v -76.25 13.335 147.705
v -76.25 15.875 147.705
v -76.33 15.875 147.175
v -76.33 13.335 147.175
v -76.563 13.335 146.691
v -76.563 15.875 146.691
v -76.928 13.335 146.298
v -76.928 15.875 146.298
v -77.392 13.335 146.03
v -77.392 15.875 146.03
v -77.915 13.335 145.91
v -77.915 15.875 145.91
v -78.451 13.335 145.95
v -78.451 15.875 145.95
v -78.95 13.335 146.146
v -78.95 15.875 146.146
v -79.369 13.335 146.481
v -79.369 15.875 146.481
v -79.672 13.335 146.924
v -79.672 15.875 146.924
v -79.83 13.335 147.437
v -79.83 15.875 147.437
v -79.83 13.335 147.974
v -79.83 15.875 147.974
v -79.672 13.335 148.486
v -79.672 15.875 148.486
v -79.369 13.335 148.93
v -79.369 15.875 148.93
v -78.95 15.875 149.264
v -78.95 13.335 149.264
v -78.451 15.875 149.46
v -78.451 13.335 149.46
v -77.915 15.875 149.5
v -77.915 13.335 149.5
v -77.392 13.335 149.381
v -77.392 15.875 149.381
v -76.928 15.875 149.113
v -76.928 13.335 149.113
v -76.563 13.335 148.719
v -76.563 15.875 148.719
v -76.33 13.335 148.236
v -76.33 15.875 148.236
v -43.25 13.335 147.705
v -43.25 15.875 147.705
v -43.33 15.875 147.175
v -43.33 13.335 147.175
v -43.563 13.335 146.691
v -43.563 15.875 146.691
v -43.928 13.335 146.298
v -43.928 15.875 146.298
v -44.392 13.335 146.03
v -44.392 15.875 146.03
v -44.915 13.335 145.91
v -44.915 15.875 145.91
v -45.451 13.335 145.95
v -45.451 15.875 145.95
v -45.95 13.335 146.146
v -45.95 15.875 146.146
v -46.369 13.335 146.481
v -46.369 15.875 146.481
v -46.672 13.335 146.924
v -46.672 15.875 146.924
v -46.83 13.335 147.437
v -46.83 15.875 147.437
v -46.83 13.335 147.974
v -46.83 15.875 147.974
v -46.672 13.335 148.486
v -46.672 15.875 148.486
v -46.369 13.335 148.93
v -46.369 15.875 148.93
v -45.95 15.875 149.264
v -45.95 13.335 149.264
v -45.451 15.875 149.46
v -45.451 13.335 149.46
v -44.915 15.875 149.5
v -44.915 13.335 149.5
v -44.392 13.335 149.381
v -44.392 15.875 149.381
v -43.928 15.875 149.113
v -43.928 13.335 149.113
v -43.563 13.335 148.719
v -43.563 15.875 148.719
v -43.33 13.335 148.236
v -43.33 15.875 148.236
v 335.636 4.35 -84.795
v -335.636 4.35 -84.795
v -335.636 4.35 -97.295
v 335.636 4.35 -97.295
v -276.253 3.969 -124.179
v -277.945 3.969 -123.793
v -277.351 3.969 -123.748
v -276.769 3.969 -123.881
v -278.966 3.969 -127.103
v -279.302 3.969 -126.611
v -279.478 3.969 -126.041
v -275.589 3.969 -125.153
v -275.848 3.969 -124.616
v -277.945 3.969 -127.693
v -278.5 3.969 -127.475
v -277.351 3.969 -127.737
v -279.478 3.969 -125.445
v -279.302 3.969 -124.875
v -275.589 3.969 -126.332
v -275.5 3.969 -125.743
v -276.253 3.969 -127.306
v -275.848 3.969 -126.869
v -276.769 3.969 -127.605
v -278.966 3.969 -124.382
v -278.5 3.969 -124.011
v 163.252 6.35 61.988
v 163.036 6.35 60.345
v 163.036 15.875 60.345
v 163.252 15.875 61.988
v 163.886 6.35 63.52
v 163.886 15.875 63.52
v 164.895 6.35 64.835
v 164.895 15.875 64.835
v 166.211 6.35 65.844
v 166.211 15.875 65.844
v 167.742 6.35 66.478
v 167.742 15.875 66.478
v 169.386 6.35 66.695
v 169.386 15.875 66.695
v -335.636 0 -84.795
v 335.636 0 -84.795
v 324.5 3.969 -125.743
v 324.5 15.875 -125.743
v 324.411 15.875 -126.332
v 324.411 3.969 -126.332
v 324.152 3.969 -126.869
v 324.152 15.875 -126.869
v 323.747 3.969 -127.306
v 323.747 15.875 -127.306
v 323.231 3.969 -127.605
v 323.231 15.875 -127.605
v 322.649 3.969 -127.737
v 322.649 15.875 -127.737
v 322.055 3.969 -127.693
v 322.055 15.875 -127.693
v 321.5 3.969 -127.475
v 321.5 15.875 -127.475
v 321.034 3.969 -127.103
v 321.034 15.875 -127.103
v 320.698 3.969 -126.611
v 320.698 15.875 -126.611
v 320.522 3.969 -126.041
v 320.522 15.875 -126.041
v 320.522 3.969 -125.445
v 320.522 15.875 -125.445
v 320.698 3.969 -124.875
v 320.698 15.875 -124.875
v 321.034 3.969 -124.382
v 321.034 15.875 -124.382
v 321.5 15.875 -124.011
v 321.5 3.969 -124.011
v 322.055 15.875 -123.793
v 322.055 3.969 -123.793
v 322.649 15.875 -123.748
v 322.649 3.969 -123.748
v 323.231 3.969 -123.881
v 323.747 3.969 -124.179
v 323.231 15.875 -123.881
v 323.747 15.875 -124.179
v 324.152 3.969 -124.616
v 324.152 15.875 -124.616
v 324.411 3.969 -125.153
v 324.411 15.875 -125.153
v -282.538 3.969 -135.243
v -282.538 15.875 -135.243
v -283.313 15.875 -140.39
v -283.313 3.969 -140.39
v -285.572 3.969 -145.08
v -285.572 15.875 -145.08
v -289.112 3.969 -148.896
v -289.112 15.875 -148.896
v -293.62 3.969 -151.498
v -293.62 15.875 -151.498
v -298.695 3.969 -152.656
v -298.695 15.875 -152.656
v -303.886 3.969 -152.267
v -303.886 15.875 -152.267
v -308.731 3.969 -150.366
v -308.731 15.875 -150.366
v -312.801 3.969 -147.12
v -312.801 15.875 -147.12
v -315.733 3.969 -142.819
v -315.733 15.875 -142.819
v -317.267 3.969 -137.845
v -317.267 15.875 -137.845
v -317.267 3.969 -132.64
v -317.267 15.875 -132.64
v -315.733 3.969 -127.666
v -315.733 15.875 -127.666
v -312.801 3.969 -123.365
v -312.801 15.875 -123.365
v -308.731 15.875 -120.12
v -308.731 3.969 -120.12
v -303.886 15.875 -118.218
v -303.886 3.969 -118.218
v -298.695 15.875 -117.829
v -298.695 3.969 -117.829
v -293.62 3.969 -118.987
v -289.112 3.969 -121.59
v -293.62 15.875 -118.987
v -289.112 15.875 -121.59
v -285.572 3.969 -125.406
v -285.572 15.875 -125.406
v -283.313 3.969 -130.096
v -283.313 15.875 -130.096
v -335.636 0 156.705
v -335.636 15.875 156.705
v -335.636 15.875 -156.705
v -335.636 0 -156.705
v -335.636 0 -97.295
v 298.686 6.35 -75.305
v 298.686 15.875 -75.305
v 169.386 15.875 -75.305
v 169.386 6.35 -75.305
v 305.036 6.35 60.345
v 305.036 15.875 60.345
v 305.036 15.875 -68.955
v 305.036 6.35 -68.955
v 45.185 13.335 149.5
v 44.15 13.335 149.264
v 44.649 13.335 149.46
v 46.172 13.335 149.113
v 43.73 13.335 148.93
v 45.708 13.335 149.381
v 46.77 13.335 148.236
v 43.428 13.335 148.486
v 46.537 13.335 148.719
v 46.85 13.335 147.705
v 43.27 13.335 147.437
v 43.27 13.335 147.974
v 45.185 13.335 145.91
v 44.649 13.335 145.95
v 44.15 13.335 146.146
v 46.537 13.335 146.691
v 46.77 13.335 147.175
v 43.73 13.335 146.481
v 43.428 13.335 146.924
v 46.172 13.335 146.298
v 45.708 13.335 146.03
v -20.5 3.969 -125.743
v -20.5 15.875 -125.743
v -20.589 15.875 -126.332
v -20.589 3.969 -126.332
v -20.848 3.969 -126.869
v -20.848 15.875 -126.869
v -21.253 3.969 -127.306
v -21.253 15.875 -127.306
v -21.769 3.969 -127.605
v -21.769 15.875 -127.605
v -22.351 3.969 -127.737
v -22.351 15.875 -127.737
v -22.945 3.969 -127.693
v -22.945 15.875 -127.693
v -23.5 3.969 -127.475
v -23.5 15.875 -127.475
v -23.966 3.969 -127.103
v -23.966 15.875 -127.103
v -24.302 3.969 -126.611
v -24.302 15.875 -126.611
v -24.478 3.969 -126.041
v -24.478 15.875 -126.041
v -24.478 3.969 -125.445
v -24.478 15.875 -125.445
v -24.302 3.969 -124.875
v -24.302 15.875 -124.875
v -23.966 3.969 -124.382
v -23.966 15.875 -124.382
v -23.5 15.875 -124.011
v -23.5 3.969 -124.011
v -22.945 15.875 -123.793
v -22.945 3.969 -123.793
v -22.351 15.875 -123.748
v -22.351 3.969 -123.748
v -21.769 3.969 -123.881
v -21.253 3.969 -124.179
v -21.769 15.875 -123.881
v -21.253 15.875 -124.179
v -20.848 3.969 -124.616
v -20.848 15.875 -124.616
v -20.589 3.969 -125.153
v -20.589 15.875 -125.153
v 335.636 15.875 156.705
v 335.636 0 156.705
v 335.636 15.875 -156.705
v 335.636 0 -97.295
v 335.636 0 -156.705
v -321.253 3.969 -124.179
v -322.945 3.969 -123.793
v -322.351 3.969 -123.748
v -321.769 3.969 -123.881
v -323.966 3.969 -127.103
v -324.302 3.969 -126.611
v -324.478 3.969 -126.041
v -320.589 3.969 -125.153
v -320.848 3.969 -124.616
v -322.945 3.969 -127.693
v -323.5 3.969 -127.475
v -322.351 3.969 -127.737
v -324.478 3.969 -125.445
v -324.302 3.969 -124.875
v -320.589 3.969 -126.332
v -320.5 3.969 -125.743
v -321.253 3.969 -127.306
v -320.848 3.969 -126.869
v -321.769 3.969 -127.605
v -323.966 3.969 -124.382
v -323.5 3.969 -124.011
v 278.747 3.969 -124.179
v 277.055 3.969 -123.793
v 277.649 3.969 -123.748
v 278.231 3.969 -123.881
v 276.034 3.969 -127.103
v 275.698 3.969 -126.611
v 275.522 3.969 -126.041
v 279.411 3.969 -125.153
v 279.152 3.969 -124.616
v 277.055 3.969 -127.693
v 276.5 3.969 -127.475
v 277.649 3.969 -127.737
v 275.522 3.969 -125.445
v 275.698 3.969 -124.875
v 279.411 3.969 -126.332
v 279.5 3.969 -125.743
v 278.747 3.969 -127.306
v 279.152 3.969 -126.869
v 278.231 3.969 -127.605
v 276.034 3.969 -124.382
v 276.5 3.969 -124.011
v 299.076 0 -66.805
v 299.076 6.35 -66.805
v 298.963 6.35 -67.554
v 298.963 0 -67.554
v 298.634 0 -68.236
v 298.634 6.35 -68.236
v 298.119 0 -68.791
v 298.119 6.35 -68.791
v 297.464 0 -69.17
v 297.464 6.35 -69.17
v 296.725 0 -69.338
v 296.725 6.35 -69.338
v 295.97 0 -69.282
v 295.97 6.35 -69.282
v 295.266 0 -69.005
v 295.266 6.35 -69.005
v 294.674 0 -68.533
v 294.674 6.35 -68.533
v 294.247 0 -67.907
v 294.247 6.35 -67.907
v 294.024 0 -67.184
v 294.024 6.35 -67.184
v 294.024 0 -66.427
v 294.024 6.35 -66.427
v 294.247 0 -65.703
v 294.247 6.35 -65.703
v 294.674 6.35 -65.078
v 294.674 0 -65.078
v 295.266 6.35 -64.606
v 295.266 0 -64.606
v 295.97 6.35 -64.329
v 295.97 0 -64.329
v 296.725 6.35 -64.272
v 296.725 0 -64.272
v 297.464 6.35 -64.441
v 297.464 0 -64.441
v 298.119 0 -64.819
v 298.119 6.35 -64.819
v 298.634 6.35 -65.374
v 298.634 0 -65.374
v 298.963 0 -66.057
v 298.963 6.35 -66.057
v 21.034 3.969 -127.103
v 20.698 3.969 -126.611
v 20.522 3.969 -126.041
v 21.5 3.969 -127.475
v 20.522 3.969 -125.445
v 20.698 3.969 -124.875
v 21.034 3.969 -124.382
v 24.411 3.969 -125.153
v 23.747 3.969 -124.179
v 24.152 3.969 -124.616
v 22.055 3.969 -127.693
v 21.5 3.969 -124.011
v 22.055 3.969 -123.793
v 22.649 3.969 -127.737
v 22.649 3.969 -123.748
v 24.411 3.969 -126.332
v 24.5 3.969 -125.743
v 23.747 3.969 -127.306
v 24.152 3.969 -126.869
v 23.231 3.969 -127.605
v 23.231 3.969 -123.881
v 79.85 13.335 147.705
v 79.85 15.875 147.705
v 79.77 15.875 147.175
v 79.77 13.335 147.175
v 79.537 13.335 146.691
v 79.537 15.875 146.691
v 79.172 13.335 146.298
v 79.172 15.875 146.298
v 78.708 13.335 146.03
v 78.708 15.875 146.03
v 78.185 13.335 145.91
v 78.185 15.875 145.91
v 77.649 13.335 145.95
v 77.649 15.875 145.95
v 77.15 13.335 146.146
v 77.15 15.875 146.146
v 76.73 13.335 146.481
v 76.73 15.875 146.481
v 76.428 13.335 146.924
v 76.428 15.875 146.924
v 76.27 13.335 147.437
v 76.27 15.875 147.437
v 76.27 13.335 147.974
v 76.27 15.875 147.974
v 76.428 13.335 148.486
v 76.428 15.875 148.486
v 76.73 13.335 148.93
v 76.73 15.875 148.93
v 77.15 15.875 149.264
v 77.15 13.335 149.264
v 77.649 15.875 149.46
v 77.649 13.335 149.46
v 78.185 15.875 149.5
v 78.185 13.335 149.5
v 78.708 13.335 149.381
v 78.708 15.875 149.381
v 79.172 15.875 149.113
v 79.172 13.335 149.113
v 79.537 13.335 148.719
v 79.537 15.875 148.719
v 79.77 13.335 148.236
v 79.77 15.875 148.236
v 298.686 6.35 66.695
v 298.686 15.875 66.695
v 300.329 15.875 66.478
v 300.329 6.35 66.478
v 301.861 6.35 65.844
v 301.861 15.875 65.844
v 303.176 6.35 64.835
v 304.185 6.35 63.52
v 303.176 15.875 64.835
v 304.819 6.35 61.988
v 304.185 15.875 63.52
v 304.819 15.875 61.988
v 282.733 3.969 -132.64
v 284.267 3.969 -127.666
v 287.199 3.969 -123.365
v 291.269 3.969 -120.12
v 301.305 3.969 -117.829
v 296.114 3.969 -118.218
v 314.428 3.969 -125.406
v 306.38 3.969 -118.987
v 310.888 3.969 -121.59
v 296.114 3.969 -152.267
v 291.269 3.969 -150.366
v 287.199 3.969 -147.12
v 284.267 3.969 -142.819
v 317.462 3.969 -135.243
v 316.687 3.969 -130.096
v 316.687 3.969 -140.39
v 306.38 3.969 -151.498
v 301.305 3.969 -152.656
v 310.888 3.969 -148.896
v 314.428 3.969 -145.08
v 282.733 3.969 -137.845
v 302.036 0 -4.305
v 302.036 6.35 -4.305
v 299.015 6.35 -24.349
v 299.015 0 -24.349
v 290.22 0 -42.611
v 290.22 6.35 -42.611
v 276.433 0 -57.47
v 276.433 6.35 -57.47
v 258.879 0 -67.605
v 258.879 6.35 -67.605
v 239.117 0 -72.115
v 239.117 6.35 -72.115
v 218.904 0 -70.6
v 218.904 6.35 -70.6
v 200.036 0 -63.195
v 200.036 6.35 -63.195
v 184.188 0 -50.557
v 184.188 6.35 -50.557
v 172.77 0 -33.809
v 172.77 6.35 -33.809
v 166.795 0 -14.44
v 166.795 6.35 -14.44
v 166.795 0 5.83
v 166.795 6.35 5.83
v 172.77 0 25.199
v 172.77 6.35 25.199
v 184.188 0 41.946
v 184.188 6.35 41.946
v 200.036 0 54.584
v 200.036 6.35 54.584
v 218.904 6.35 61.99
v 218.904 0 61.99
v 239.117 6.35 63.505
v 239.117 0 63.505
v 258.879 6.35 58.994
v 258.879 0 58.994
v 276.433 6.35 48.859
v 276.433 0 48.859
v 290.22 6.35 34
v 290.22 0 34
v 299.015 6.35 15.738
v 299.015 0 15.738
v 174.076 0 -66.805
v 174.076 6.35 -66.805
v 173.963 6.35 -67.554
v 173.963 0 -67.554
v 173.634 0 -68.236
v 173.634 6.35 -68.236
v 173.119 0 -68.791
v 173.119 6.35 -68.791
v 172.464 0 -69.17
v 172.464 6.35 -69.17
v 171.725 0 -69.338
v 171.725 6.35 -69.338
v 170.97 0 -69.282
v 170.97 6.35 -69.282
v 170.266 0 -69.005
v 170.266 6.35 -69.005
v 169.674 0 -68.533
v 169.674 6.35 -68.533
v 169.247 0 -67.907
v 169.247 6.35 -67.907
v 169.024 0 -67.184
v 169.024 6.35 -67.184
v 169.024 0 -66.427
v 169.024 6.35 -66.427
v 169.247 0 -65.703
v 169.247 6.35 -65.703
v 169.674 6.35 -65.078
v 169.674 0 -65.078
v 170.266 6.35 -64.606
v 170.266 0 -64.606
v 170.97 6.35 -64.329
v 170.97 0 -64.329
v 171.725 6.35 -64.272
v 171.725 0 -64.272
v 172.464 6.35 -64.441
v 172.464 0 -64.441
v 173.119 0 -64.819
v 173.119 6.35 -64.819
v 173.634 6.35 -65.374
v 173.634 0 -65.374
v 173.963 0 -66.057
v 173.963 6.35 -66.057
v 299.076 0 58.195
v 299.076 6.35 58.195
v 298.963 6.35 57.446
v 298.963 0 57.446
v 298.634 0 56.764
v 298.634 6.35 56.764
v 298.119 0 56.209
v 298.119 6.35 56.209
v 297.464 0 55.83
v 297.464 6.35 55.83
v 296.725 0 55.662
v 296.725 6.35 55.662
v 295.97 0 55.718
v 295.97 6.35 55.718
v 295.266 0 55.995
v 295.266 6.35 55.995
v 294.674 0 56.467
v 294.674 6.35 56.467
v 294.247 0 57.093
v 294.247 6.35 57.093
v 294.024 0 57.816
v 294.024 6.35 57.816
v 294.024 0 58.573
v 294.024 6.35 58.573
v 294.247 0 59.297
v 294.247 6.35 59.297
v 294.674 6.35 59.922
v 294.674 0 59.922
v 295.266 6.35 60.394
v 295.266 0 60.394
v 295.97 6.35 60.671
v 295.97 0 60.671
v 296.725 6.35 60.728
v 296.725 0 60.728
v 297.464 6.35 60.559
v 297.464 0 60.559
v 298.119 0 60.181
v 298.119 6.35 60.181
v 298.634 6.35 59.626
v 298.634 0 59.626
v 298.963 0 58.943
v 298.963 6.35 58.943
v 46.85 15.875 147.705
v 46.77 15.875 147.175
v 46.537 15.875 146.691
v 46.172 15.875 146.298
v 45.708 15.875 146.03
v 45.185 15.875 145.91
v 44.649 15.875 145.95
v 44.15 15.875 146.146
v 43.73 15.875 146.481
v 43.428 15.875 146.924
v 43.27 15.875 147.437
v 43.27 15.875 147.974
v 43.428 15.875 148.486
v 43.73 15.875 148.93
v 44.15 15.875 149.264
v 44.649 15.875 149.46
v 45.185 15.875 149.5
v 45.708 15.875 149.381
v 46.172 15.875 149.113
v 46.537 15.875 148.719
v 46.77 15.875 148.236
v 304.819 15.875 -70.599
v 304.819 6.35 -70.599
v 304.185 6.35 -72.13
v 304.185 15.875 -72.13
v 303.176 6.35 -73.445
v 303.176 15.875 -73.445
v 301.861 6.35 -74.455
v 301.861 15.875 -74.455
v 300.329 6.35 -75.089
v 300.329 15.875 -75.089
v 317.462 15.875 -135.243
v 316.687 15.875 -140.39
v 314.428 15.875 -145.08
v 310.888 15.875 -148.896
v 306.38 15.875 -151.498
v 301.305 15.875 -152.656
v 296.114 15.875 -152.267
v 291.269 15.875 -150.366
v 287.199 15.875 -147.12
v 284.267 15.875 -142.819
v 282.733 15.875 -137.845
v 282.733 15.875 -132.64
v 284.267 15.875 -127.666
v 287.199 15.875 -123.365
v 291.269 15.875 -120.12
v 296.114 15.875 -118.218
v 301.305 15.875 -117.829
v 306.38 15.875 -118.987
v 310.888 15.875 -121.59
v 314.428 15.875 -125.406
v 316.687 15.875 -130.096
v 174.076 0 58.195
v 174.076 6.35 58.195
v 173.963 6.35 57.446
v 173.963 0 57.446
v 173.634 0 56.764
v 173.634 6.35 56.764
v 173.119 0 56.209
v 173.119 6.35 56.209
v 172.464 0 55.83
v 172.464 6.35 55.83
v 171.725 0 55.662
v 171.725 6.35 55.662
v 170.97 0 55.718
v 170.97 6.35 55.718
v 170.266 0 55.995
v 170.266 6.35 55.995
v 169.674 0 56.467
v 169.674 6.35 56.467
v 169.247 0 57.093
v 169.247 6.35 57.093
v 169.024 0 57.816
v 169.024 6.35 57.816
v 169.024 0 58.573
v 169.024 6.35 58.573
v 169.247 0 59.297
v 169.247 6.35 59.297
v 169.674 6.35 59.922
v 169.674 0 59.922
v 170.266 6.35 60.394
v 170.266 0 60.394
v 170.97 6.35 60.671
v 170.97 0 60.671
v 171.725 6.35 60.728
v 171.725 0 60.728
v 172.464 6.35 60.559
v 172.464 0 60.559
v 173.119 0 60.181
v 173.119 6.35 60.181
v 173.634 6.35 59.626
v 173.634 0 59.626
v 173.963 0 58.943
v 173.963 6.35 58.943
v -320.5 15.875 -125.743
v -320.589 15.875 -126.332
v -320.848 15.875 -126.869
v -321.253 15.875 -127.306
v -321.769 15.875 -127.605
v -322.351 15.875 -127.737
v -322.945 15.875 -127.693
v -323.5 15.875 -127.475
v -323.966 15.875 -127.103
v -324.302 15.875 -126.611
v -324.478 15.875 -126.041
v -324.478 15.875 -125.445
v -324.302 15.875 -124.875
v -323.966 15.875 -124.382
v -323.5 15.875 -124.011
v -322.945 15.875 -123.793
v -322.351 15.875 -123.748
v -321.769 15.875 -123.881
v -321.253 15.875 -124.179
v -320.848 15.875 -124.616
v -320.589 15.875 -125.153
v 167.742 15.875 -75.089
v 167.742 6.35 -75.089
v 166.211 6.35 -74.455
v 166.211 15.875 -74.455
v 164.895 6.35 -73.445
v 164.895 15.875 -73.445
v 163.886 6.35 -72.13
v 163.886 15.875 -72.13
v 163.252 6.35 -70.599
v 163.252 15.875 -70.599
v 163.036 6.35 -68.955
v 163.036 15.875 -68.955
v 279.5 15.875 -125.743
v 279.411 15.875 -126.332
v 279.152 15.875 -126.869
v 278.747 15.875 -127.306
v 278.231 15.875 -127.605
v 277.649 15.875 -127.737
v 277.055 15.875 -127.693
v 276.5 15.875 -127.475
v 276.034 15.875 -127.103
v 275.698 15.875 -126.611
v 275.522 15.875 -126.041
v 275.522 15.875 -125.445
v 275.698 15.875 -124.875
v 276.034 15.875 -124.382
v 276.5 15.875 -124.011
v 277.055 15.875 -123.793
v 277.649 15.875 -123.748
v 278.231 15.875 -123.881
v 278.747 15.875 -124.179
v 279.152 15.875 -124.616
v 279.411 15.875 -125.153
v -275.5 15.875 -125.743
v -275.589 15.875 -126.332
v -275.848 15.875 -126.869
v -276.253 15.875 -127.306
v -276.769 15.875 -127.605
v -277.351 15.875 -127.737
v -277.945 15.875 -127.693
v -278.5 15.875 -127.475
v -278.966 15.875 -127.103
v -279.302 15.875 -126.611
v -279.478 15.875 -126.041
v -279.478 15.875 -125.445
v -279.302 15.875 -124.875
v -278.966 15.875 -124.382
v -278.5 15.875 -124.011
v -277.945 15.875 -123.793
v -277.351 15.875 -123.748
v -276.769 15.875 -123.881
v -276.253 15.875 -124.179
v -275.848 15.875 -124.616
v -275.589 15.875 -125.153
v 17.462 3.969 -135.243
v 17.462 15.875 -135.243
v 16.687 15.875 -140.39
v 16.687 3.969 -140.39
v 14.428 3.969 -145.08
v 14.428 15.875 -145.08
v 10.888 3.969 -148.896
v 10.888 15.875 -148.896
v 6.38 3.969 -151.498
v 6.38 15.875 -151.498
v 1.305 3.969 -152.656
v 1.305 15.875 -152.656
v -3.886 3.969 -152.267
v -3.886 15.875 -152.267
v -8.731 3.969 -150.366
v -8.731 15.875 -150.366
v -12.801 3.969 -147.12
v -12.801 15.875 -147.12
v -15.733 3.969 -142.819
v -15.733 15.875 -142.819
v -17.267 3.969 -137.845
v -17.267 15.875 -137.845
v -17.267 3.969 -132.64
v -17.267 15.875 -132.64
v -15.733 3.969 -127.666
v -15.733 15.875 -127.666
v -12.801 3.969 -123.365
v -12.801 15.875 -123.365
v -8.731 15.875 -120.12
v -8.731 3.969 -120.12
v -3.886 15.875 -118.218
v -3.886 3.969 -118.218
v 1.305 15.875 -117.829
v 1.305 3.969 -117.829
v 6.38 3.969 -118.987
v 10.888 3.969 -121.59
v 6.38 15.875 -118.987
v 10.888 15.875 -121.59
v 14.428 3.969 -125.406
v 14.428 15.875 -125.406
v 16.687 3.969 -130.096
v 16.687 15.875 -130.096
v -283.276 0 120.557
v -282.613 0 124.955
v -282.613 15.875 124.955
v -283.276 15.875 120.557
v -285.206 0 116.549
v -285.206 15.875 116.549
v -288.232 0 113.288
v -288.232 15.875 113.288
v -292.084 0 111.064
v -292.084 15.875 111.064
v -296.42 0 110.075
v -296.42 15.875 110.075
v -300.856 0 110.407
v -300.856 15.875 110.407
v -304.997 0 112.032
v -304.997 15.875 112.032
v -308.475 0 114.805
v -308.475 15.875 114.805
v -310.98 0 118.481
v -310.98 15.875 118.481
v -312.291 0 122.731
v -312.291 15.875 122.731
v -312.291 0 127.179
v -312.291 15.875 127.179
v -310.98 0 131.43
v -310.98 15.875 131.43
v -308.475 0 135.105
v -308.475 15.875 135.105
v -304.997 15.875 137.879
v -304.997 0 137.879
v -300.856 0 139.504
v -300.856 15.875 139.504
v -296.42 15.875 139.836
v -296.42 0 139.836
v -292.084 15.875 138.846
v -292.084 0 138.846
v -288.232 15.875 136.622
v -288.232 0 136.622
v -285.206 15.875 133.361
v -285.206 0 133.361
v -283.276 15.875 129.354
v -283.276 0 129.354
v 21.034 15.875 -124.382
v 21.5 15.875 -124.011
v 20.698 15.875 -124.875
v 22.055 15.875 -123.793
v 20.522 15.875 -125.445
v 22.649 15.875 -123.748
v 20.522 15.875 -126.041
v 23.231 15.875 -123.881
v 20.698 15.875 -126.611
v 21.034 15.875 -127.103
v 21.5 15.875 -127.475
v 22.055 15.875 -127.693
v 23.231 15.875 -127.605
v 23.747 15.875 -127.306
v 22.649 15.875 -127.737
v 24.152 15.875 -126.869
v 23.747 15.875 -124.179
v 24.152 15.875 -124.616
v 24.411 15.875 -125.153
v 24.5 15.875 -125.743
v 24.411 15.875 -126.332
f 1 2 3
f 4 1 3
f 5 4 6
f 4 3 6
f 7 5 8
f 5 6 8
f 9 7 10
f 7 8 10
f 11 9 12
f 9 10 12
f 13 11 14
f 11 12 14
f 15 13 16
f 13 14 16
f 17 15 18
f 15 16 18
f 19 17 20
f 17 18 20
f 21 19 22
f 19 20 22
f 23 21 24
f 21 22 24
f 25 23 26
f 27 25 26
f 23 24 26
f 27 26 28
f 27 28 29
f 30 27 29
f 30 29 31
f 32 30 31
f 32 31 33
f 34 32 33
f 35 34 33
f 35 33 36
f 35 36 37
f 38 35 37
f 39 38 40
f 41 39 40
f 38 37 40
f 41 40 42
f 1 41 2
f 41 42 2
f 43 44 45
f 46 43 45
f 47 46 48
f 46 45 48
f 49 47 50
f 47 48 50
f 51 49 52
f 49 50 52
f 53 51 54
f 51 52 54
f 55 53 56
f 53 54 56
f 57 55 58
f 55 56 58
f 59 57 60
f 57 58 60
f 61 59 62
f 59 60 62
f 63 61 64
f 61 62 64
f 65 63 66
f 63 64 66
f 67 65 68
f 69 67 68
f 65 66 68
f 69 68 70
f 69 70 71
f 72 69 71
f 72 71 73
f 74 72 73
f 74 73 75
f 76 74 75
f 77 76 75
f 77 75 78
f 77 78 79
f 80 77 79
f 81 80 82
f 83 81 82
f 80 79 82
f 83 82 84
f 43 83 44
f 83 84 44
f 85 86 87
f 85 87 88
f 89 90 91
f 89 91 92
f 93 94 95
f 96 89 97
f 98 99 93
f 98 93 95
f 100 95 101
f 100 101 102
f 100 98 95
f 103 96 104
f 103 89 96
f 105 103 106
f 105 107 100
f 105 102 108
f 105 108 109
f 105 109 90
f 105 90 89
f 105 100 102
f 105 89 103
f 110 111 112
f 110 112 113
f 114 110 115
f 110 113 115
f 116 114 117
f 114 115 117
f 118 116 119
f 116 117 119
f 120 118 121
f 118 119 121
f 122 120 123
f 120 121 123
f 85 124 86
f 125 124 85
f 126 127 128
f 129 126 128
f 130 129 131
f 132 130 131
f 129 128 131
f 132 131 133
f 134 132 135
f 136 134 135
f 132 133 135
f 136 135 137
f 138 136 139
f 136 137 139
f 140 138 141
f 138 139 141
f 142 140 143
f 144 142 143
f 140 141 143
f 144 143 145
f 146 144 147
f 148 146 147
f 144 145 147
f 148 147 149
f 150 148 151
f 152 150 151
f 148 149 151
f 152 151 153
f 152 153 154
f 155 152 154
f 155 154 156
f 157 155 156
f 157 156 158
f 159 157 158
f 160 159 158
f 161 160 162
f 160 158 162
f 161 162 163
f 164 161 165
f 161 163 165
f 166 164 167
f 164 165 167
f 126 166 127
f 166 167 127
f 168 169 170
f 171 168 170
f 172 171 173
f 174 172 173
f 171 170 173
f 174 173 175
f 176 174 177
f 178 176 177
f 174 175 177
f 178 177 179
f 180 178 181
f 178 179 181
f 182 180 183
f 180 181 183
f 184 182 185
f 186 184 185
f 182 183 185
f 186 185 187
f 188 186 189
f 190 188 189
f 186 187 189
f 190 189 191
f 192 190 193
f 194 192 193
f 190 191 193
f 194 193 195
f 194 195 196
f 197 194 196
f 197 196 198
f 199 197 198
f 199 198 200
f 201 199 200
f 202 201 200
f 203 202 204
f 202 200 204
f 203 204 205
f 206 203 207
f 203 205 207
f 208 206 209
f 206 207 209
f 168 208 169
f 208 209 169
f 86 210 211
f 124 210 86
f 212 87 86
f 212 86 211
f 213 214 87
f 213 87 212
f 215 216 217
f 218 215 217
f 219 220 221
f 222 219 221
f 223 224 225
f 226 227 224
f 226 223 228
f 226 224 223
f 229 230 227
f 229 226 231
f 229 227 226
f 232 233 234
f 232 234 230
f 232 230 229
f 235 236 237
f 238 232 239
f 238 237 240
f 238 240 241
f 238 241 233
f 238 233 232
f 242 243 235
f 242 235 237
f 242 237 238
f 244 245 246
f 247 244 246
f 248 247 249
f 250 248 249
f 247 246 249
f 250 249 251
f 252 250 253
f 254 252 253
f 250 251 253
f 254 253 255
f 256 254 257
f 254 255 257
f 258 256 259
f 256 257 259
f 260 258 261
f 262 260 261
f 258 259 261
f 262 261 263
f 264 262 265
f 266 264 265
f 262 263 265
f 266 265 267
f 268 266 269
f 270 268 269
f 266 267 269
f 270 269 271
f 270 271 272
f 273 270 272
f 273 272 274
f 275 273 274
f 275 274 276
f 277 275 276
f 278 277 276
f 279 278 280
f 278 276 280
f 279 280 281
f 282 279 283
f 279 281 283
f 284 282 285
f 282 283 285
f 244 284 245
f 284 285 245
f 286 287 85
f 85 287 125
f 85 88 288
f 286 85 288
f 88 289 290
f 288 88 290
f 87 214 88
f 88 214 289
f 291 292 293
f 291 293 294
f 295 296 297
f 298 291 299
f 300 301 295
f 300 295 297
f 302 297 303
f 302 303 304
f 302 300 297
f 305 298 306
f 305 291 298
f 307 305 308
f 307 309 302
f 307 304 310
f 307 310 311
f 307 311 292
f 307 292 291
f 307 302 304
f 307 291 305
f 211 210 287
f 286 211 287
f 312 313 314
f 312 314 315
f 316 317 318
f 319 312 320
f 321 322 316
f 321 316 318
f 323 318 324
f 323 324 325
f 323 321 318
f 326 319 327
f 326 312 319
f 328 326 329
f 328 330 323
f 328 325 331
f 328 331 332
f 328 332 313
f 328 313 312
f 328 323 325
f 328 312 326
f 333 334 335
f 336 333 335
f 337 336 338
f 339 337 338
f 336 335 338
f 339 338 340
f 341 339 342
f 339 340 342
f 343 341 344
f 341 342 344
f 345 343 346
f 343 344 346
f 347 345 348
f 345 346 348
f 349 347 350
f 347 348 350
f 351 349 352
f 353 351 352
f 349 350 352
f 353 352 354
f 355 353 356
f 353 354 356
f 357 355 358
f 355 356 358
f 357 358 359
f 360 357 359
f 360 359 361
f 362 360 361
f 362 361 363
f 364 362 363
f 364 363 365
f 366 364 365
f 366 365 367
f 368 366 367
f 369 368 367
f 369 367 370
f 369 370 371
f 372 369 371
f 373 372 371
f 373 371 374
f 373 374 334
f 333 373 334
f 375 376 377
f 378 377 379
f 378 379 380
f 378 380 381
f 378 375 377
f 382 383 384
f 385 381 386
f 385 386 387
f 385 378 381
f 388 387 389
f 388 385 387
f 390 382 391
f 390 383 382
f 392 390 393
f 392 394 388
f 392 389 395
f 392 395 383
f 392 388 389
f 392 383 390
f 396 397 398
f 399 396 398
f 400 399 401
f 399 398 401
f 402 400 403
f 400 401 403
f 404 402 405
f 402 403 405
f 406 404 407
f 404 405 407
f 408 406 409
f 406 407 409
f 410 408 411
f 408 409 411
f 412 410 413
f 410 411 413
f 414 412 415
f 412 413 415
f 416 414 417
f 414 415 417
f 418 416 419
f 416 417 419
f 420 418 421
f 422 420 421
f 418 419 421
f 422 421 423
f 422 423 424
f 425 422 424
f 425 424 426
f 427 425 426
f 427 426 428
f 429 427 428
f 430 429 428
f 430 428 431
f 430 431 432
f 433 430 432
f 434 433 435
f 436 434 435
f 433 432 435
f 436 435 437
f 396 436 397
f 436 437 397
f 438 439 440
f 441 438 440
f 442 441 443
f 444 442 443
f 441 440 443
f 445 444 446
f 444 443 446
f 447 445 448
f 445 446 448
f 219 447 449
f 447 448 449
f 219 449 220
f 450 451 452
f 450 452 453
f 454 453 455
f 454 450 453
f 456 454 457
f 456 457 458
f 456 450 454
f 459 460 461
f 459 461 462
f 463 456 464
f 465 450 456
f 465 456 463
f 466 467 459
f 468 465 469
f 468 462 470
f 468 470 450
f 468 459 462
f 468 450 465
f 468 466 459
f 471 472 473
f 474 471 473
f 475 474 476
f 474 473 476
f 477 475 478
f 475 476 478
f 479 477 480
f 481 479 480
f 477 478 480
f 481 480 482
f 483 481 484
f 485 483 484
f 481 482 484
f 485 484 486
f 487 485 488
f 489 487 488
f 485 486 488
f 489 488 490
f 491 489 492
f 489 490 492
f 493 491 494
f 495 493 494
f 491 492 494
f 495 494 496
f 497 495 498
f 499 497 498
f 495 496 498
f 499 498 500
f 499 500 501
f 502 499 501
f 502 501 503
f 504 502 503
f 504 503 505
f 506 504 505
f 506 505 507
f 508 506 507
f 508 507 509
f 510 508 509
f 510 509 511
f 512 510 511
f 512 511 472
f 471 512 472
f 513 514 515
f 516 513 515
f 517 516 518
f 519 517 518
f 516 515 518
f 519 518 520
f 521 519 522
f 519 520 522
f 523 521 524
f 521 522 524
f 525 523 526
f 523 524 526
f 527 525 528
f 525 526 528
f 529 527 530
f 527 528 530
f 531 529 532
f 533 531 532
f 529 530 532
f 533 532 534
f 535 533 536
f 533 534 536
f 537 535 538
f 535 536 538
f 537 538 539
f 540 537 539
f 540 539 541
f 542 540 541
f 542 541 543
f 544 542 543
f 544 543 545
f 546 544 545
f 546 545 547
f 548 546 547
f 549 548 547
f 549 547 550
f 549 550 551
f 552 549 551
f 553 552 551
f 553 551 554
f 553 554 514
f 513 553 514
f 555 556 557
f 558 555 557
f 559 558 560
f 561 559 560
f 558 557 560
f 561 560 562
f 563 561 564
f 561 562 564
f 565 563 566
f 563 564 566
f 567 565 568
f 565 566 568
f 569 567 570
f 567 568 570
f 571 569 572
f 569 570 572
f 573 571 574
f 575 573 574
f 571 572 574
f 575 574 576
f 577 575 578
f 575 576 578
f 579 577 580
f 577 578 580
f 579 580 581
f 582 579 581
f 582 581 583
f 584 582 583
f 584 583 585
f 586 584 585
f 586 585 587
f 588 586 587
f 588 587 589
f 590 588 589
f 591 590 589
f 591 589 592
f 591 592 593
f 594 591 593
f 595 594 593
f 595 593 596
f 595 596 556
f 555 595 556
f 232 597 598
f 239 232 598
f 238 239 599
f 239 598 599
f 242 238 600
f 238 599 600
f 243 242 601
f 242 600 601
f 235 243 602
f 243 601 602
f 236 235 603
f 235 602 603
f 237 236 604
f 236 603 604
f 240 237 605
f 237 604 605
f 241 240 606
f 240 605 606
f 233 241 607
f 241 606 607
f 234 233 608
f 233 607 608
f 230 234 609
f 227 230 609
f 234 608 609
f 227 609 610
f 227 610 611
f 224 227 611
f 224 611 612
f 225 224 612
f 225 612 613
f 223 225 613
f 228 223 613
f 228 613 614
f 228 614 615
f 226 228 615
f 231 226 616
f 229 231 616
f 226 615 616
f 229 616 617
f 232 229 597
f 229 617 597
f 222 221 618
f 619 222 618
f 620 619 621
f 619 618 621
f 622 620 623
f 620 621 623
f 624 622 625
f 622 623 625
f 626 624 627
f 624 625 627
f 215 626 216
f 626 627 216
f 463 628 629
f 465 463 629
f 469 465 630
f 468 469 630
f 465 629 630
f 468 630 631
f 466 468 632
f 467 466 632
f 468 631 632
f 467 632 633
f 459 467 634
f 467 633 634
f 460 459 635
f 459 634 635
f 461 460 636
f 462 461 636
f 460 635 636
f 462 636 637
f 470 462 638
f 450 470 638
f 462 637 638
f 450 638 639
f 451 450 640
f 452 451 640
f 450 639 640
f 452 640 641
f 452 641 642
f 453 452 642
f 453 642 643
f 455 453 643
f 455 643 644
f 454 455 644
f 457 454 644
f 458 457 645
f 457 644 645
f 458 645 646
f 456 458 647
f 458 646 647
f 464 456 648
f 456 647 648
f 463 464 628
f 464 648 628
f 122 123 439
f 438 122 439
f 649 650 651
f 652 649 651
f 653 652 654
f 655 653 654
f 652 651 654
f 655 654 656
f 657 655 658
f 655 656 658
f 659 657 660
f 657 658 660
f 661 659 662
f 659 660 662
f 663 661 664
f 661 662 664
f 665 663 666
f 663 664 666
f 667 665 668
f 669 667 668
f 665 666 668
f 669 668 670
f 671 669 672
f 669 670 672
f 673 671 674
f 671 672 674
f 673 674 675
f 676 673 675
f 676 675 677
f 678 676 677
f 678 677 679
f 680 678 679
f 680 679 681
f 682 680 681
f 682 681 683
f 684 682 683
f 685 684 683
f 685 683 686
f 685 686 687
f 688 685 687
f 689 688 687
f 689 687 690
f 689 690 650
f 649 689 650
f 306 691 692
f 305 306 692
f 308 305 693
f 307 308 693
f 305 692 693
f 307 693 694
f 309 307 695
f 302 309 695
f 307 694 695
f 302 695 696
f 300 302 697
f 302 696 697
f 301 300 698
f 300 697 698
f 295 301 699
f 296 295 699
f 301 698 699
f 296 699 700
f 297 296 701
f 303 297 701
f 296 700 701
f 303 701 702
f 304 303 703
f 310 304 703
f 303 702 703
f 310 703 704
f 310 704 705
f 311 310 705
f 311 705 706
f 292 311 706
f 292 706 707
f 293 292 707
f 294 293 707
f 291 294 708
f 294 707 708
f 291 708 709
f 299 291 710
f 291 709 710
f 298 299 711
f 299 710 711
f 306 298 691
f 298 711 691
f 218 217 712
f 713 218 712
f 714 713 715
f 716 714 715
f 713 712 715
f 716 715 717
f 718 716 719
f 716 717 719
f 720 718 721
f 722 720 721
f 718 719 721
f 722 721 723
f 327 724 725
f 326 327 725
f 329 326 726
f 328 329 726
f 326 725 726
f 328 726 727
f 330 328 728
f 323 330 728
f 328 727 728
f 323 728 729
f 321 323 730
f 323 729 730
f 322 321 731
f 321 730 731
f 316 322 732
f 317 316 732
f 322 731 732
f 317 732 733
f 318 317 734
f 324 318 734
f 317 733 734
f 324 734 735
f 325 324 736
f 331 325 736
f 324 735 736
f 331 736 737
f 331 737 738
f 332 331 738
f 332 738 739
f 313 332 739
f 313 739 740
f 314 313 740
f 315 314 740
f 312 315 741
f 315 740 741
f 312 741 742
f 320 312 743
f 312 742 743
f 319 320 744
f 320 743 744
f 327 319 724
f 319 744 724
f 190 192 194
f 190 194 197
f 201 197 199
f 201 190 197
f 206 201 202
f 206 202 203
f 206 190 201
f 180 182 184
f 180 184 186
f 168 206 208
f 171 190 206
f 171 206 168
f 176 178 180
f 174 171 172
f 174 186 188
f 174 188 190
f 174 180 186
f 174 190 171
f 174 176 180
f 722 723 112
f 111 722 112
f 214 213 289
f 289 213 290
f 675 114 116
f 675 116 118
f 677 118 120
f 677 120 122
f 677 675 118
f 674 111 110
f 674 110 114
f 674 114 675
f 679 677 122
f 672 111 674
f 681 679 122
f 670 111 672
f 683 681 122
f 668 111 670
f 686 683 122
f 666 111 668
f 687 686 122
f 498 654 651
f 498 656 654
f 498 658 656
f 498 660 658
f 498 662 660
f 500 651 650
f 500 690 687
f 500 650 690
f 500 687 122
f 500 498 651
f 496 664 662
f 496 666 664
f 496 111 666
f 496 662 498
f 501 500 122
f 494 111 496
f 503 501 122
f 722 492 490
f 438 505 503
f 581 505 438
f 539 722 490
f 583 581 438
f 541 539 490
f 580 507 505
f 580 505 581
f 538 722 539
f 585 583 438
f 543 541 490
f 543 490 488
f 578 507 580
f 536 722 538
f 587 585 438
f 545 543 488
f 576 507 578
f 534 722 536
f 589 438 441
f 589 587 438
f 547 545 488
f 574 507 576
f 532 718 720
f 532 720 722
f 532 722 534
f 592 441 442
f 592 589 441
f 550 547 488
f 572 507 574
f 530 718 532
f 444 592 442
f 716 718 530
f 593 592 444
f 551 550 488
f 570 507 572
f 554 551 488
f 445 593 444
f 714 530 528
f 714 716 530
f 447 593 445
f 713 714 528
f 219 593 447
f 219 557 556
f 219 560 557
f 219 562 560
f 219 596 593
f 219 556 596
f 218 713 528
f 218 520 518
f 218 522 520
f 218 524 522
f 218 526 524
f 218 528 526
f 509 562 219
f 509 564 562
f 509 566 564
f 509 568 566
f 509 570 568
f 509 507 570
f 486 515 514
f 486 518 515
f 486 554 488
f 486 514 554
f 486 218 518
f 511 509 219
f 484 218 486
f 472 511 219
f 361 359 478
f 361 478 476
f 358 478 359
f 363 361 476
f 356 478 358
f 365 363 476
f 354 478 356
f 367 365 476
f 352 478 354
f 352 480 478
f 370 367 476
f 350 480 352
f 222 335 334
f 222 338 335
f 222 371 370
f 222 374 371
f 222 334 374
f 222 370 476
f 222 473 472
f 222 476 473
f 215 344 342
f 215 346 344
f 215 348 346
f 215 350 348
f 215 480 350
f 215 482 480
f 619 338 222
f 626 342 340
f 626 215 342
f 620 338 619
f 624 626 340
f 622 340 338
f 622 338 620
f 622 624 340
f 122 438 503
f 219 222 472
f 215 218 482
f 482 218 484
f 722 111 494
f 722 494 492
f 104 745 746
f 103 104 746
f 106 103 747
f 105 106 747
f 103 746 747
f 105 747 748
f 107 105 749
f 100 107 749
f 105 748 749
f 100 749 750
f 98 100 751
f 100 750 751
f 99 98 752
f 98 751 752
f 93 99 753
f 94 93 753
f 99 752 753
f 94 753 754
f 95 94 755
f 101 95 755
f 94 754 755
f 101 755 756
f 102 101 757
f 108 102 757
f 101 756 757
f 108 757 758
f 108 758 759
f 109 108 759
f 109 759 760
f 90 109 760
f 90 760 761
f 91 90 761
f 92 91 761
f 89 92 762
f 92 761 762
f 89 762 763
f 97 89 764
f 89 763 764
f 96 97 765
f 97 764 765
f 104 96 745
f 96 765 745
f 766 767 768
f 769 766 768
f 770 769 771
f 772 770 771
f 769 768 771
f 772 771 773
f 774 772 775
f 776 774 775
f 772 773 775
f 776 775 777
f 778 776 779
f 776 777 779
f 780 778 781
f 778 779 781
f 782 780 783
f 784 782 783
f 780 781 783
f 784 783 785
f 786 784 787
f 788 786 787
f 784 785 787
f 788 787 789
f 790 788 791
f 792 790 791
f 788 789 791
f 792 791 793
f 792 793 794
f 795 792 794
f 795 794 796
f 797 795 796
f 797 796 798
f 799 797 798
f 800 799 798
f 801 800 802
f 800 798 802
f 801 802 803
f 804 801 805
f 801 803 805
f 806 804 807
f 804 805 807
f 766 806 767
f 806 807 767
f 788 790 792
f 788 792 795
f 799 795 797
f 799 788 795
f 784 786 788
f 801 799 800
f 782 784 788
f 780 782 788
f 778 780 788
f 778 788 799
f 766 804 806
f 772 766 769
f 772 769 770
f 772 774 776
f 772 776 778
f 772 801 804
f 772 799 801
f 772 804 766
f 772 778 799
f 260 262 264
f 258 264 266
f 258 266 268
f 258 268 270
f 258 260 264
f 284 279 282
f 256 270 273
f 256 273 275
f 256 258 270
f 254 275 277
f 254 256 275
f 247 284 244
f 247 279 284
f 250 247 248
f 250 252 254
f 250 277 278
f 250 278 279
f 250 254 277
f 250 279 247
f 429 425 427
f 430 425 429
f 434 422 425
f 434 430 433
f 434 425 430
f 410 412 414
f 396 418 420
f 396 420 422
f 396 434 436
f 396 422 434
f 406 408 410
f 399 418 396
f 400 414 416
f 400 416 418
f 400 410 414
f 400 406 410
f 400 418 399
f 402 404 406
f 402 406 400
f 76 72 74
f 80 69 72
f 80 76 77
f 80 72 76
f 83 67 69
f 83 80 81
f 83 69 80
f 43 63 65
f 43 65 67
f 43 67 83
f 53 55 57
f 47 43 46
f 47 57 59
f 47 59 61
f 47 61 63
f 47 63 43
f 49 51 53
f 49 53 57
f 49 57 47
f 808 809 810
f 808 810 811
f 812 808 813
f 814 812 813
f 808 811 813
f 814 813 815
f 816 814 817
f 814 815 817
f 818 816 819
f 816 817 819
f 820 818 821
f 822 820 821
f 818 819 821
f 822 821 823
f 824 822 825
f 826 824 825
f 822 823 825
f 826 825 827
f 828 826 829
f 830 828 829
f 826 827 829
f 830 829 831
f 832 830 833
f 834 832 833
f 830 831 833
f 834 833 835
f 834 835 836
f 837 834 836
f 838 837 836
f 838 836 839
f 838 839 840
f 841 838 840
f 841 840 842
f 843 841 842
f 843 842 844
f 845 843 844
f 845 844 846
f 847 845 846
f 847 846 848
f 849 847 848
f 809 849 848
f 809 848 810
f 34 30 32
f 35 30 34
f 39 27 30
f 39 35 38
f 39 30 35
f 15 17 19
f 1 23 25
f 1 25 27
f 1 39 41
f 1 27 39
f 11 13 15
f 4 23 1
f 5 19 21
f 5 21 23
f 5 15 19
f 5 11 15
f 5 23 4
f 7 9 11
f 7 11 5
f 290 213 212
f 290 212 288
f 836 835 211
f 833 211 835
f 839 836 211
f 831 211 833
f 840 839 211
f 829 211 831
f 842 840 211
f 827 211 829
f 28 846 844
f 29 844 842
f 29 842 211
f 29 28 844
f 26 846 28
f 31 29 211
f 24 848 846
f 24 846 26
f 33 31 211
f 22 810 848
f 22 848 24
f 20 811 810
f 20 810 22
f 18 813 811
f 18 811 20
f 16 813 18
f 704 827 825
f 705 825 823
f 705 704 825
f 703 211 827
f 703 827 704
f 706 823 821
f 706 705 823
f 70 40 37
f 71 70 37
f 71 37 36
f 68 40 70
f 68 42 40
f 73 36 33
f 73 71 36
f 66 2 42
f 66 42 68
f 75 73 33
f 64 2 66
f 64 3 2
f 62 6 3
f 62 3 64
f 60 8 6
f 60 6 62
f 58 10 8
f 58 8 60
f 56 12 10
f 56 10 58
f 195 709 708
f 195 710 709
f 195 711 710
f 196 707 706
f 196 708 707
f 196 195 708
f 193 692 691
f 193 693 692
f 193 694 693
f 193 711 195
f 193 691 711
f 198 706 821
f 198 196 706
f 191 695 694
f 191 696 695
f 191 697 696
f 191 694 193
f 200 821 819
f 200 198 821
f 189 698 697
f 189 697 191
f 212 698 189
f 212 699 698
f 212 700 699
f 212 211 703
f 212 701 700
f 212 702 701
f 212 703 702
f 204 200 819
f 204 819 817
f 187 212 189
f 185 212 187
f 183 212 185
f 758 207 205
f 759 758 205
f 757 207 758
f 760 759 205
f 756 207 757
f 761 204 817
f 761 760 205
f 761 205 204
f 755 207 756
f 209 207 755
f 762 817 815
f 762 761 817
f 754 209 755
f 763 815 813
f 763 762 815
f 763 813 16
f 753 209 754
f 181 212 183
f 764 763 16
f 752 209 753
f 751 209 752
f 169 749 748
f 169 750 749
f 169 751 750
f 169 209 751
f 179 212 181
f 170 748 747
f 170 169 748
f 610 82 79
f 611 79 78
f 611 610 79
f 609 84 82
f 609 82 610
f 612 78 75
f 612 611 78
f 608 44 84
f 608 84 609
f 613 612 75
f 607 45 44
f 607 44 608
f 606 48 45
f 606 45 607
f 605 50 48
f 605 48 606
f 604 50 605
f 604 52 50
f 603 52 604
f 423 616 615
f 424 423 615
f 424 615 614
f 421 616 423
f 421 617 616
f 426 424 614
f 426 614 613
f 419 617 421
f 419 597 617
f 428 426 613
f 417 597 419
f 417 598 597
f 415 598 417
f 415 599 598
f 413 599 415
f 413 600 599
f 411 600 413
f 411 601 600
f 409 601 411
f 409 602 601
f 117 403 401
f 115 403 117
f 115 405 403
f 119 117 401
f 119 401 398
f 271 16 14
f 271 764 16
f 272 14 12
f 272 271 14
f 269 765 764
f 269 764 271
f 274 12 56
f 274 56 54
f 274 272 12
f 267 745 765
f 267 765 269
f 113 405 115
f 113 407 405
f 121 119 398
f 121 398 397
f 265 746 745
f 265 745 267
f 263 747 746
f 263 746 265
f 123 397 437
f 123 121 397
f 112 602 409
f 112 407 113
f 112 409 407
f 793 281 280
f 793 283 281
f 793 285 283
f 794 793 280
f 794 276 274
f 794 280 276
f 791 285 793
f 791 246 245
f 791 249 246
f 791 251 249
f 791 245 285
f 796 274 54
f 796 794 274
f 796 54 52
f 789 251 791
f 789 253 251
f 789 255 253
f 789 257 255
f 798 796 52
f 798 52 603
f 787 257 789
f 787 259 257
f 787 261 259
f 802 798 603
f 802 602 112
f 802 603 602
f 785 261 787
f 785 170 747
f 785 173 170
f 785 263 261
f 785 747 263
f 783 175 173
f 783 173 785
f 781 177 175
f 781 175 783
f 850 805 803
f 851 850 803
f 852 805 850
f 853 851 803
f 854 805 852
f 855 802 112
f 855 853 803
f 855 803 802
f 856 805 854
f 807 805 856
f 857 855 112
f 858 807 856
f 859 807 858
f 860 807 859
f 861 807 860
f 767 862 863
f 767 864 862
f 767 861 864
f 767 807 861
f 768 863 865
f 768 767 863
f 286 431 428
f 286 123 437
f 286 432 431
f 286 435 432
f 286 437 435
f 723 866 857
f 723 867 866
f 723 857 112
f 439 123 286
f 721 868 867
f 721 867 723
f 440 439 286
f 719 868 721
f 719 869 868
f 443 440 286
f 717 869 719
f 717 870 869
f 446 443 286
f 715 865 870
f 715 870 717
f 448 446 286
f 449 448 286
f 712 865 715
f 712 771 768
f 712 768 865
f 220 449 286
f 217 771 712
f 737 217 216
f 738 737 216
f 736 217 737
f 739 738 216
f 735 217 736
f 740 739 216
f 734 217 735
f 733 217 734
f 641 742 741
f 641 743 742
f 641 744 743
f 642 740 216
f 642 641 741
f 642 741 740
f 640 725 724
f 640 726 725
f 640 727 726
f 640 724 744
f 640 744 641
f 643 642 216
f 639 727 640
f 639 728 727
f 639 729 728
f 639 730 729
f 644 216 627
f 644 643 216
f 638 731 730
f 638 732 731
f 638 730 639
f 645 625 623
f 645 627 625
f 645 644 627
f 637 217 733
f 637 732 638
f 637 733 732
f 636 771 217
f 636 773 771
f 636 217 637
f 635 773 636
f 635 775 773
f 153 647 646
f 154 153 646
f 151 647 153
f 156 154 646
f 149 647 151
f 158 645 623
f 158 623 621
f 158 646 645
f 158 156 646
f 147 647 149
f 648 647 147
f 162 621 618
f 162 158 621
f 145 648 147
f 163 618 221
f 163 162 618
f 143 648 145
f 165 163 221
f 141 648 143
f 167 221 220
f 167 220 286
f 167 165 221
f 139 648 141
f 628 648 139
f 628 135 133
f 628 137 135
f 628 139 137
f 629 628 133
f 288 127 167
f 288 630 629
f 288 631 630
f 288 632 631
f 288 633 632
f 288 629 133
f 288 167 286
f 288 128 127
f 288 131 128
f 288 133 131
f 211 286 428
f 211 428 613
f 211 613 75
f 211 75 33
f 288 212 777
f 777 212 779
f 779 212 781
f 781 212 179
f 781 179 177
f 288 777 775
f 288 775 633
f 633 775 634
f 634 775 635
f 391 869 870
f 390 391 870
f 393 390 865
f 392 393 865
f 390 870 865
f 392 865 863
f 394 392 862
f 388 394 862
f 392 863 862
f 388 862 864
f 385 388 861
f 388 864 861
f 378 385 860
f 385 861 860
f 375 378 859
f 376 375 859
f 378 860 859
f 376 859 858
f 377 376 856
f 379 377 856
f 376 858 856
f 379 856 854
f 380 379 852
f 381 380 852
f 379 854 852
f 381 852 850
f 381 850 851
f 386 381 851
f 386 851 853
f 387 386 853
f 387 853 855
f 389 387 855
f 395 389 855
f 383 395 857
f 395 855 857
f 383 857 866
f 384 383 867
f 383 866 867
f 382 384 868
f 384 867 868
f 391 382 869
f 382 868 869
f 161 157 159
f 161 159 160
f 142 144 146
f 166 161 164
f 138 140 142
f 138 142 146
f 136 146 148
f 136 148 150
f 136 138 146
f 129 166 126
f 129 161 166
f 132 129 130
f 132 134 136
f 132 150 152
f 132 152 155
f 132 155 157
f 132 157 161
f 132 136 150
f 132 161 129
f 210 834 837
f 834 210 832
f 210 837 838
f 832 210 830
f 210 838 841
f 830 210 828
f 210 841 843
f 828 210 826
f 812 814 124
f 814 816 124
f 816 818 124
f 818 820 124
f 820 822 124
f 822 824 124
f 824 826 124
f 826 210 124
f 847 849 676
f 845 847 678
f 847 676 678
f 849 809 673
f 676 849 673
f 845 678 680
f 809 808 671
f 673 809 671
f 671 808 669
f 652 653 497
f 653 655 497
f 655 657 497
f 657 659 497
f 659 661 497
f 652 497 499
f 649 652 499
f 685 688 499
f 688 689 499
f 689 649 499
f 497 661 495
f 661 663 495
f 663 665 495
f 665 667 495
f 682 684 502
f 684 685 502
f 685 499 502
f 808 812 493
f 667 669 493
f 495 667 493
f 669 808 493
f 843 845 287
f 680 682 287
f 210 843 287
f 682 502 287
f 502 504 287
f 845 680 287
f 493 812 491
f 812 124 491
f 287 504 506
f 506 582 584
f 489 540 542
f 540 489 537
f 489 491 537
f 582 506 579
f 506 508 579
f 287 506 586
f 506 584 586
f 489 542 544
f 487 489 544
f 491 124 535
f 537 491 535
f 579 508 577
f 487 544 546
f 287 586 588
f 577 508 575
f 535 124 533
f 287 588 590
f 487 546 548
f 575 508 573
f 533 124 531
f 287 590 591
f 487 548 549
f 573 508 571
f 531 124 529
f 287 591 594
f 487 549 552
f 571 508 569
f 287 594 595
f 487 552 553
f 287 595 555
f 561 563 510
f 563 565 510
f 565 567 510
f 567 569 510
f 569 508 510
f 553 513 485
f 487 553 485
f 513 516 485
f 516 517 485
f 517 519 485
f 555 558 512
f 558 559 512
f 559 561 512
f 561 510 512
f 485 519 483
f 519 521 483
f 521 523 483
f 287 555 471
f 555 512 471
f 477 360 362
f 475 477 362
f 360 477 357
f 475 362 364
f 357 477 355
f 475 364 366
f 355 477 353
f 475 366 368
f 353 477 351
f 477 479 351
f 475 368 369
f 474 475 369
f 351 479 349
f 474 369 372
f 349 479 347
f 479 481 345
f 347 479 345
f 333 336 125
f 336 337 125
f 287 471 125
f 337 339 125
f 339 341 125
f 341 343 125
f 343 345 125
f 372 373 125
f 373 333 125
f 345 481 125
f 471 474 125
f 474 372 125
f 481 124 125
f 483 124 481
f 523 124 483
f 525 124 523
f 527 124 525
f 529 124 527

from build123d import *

# Parameters (mm, degrees)
SKETCH1_W               = 671.2712
SKETCH1_H               = 313.4106
BOSS_EXTRUDE1_DEPTH     = 15.875
SKETCH4_R               = 14.9225
CUT_EXTRUDE2_DEPTH      = 1
CUT_EXTRUDE2_DEPTH_BACK = 16.875
SKETCH5_R               = 17.4625
SKETCH5_R_2             = 2
CUT_EXTRUDE3_DEPTH      = 11.90625
SKETCH6_R               = 1.8
CUT_EXTRUDE4_DEPTH      = 2.54
SKETCH7_R               = 68
SKETCH7_R_2             = 2.54
CUT_EXTRUDE5_DEPTH      = 1
CUT_EXTRUDE5_DEPTH_BACK = 16.875
CUT_EXTRUDE6_DEPTH      = 9.525
SKETCH9_W               = 671.2712
SKETCH9_H               = 12.5
CUT_EXTRUDE7_DEPTH      = 4.35


with BuildPart() as part:
    # Sketch1 → Boss-Extrude1 (new body)
    with BuildSketch(Plane(origin=(0, 0, 0), x_dir=(1, 0, 0), z_dir=(0, 1, 0))):
        Rectangle(SKETCH1_W, SKETCH1_H)
    extrude(amount=BOSS_EXTRUDE1_DEPTH)

    # Sketch4 → Cut-Extrude2 (cut, two sides)
    with BuildSketch(Plane(origin=(0, 15.875, 0), x_dir=(1, 0, 0), z_dir=(0, 1, 0))) as cut_extrude2_sk:
        with Locations((-297.5356, -124.9553)):
            Circle(SKETCH4_R)
    extrude(amount=CUT_EXTRUDE2_DEPTH, mode=Mode.SUBTRACT)
    extrude(cut_extrude2_sk.sketch, amount=-CUT_EXTRUDE2_DEPTH_BACK, mode=Mode.SUBTRACT)

    # Sketch5 → Cut-Extrude3 (cut)
    with BuildSketch(Plane(origin=(0, 15.875, 0), x_dir=(1, 0, 0), z_dir=(0, 1, 0))):
        with Locations((0, 135.2428)):
            Circle(SKETCH5_R)
        with Locations((22.5, 125.7428)):
            Circle(SKETCH5_R_2)
        with Locations((-22.5, 125.7428)):
            Circle(SKETCH5_R_2)
        with Locations((-300, 135.2428)):
            Circle(SKETCH5_R)
        with Locations((-277.5, 125.7428)):
            Circle(SKETCH5_R_2)
        with Locations((-322.5, 125.7428)):
            Circle(SKETCH5_R_2)
        with Locations((322.5, 125.7428)):
            Circle(SKETCH5_R_2)
        with Locations((277.5, 125.7428)):
            Circle(SKETCH5_R_2)
        with Locations((300, 135.2428)):
            Circle(SKETCH5_R)
    extrude(amount=-CUT_EXTRUDE3_DEPTH, mode=Mode.SUBTRACT)

    # Sketch6 → Cut-Extrude4 (cut)
    with BuildSketch(Plane(origin=(0, 15.875, 0), x_dir=(1, 0, 0), z_dir=(0, 1, 0))):
        with Locations((78.0499912, -147.7053)):
            Circle(SKETCH6_R)
        with Locations((45.0499912, -147.7053)):
            Circle(SKETCH6_R)
        with Locations((-45.0499912, -147.7053)):
            Circle(SKETCH6_R)
        with Locations((-78.0499912, -147.7053)):
            Circle(SKETCH6_R)
    extrude(amount=-CUT_EXTRUDE4_DEPTH, mode=Mode.SUBTRACT)

    # Sketch7 → Cut-Extrude5 (cut, two sides)
    with BuildSketch(Plane(origin=(0, 15.875, 0), x_dir=(1, 0, 0), z_dir=(0, 1, 0))) as cut_extrude5_sk:
        with Locations((234.0356, 4.3053)):
            Circle(SKETCH7_R)
        with Locations((296.5356, -58.1947)):
            Circle(SKETCH7_R_2)
        with Locations((296.5356, 66.8053)):
            Circle(SKETCH7_R_2)
        with Locations((171.5356, 66.8053)):
            Circle(SKETCH7_R_2)
        with Locations((171.5356, -58.1947)):
            Circle(SKETCH7_R_2)
    extrude(amount=CUT_EXTRUDE5_DEPTH, mode=Mode.SUBTRACT)
    extrude(cut_extrude5_sk.sketch, amount=-CUT_EXTRUDE5_DEPTH_BACK, mode=Mode.SUBTRACT)

    # Sketch8 → Cut-Extrude6 (cut)
    with BuildSketch(Plane(origin=(0, 15.875, 0), x_dir=(1, 0, 0), z_dir=(0, 1, 0))):
        with BuildLine():
            Line((169.3856, -66.6947), (298.6856, -66.6947))
            ThreePointArc((298.6856, -66.6947), (303.175728061, -64.834828061), (305.0356, -60.3447))
            Line((305.0356, -60.3447), (305.0356, 68.9553))
            ThreePointArc((305.0356, 68.9553), (303.175728061, 73.445428061), (298.6856, 75.3053))
            Line((298.6856, 75.3053), (169.3856, 75.3053))
            ThreePointArc((169.3856, 75.3053), (164.895471939, 73.445428061), (163.0356, 68.9553))
            Line((163.0356, 68.9553), (163.0356, -60.3447))
            ThreePointArc((163.0356, -60.3447), (164.895471939, -64.834828061), (169.3856, -66.6947))
        make_face()
    extrude(amount=-CUT_EXTRUDE6_DEPTH, mode=Mode.SUBTRACT)

    # Sketch9 → Cut-Extrude7 (cut)
    with BuildSketch(Plane.XZ):
        with Locations((0, -91.0447)):
            Rectangle(SKETCH9_W, SKETCH9_H)
    extrude(amount=-CUT_EXTRUDE7_DEPTH, mode=Mode.SUBTRACT)


solid = part.part
